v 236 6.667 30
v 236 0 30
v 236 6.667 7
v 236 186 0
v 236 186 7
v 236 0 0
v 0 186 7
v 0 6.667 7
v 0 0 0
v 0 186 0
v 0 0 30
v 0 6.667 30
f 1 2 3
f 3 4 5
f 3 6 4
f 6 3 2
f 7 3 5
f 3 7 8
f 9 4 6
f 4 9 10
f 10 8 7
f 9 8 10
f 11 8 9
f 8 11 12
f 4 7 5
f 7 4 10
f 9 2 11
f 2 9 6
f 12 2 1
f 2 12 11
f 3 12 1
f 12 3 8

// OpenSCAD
/**
 * This model is for a shelf to fit my ASUS RT-AX82U router and will be the top
 * shelf for my homelab network shelf.
 */

plateWidth = 256;
plateBorder = 20;


// 10.25" width router
routerWidth = 261;
// 6.5" deep router
routerDepth = 166;
routerDepthMargin = 20;

// 23mm bottom to bottom of ethernet
backHeight = 23;

shelfHeight = 7;
wallWidth = routerDepthMargin / 3;
wallHeight = backHeight - shelfHeight;

union() {
    // base
    cube(
        [
            plateWidth - plateBorder,
            routerDepth + routerDepthMargin,
            shelfHeight
        ]
    );

    // back wall
    translate([
        0,
        0,//-(routerDepth + routerDepthMargin) / 2,
        shelfHeight
    ])
    cube(
        [
            plateWidth - plateBorder,
            wallWidth,
            backHeight
        ]
    );
}
